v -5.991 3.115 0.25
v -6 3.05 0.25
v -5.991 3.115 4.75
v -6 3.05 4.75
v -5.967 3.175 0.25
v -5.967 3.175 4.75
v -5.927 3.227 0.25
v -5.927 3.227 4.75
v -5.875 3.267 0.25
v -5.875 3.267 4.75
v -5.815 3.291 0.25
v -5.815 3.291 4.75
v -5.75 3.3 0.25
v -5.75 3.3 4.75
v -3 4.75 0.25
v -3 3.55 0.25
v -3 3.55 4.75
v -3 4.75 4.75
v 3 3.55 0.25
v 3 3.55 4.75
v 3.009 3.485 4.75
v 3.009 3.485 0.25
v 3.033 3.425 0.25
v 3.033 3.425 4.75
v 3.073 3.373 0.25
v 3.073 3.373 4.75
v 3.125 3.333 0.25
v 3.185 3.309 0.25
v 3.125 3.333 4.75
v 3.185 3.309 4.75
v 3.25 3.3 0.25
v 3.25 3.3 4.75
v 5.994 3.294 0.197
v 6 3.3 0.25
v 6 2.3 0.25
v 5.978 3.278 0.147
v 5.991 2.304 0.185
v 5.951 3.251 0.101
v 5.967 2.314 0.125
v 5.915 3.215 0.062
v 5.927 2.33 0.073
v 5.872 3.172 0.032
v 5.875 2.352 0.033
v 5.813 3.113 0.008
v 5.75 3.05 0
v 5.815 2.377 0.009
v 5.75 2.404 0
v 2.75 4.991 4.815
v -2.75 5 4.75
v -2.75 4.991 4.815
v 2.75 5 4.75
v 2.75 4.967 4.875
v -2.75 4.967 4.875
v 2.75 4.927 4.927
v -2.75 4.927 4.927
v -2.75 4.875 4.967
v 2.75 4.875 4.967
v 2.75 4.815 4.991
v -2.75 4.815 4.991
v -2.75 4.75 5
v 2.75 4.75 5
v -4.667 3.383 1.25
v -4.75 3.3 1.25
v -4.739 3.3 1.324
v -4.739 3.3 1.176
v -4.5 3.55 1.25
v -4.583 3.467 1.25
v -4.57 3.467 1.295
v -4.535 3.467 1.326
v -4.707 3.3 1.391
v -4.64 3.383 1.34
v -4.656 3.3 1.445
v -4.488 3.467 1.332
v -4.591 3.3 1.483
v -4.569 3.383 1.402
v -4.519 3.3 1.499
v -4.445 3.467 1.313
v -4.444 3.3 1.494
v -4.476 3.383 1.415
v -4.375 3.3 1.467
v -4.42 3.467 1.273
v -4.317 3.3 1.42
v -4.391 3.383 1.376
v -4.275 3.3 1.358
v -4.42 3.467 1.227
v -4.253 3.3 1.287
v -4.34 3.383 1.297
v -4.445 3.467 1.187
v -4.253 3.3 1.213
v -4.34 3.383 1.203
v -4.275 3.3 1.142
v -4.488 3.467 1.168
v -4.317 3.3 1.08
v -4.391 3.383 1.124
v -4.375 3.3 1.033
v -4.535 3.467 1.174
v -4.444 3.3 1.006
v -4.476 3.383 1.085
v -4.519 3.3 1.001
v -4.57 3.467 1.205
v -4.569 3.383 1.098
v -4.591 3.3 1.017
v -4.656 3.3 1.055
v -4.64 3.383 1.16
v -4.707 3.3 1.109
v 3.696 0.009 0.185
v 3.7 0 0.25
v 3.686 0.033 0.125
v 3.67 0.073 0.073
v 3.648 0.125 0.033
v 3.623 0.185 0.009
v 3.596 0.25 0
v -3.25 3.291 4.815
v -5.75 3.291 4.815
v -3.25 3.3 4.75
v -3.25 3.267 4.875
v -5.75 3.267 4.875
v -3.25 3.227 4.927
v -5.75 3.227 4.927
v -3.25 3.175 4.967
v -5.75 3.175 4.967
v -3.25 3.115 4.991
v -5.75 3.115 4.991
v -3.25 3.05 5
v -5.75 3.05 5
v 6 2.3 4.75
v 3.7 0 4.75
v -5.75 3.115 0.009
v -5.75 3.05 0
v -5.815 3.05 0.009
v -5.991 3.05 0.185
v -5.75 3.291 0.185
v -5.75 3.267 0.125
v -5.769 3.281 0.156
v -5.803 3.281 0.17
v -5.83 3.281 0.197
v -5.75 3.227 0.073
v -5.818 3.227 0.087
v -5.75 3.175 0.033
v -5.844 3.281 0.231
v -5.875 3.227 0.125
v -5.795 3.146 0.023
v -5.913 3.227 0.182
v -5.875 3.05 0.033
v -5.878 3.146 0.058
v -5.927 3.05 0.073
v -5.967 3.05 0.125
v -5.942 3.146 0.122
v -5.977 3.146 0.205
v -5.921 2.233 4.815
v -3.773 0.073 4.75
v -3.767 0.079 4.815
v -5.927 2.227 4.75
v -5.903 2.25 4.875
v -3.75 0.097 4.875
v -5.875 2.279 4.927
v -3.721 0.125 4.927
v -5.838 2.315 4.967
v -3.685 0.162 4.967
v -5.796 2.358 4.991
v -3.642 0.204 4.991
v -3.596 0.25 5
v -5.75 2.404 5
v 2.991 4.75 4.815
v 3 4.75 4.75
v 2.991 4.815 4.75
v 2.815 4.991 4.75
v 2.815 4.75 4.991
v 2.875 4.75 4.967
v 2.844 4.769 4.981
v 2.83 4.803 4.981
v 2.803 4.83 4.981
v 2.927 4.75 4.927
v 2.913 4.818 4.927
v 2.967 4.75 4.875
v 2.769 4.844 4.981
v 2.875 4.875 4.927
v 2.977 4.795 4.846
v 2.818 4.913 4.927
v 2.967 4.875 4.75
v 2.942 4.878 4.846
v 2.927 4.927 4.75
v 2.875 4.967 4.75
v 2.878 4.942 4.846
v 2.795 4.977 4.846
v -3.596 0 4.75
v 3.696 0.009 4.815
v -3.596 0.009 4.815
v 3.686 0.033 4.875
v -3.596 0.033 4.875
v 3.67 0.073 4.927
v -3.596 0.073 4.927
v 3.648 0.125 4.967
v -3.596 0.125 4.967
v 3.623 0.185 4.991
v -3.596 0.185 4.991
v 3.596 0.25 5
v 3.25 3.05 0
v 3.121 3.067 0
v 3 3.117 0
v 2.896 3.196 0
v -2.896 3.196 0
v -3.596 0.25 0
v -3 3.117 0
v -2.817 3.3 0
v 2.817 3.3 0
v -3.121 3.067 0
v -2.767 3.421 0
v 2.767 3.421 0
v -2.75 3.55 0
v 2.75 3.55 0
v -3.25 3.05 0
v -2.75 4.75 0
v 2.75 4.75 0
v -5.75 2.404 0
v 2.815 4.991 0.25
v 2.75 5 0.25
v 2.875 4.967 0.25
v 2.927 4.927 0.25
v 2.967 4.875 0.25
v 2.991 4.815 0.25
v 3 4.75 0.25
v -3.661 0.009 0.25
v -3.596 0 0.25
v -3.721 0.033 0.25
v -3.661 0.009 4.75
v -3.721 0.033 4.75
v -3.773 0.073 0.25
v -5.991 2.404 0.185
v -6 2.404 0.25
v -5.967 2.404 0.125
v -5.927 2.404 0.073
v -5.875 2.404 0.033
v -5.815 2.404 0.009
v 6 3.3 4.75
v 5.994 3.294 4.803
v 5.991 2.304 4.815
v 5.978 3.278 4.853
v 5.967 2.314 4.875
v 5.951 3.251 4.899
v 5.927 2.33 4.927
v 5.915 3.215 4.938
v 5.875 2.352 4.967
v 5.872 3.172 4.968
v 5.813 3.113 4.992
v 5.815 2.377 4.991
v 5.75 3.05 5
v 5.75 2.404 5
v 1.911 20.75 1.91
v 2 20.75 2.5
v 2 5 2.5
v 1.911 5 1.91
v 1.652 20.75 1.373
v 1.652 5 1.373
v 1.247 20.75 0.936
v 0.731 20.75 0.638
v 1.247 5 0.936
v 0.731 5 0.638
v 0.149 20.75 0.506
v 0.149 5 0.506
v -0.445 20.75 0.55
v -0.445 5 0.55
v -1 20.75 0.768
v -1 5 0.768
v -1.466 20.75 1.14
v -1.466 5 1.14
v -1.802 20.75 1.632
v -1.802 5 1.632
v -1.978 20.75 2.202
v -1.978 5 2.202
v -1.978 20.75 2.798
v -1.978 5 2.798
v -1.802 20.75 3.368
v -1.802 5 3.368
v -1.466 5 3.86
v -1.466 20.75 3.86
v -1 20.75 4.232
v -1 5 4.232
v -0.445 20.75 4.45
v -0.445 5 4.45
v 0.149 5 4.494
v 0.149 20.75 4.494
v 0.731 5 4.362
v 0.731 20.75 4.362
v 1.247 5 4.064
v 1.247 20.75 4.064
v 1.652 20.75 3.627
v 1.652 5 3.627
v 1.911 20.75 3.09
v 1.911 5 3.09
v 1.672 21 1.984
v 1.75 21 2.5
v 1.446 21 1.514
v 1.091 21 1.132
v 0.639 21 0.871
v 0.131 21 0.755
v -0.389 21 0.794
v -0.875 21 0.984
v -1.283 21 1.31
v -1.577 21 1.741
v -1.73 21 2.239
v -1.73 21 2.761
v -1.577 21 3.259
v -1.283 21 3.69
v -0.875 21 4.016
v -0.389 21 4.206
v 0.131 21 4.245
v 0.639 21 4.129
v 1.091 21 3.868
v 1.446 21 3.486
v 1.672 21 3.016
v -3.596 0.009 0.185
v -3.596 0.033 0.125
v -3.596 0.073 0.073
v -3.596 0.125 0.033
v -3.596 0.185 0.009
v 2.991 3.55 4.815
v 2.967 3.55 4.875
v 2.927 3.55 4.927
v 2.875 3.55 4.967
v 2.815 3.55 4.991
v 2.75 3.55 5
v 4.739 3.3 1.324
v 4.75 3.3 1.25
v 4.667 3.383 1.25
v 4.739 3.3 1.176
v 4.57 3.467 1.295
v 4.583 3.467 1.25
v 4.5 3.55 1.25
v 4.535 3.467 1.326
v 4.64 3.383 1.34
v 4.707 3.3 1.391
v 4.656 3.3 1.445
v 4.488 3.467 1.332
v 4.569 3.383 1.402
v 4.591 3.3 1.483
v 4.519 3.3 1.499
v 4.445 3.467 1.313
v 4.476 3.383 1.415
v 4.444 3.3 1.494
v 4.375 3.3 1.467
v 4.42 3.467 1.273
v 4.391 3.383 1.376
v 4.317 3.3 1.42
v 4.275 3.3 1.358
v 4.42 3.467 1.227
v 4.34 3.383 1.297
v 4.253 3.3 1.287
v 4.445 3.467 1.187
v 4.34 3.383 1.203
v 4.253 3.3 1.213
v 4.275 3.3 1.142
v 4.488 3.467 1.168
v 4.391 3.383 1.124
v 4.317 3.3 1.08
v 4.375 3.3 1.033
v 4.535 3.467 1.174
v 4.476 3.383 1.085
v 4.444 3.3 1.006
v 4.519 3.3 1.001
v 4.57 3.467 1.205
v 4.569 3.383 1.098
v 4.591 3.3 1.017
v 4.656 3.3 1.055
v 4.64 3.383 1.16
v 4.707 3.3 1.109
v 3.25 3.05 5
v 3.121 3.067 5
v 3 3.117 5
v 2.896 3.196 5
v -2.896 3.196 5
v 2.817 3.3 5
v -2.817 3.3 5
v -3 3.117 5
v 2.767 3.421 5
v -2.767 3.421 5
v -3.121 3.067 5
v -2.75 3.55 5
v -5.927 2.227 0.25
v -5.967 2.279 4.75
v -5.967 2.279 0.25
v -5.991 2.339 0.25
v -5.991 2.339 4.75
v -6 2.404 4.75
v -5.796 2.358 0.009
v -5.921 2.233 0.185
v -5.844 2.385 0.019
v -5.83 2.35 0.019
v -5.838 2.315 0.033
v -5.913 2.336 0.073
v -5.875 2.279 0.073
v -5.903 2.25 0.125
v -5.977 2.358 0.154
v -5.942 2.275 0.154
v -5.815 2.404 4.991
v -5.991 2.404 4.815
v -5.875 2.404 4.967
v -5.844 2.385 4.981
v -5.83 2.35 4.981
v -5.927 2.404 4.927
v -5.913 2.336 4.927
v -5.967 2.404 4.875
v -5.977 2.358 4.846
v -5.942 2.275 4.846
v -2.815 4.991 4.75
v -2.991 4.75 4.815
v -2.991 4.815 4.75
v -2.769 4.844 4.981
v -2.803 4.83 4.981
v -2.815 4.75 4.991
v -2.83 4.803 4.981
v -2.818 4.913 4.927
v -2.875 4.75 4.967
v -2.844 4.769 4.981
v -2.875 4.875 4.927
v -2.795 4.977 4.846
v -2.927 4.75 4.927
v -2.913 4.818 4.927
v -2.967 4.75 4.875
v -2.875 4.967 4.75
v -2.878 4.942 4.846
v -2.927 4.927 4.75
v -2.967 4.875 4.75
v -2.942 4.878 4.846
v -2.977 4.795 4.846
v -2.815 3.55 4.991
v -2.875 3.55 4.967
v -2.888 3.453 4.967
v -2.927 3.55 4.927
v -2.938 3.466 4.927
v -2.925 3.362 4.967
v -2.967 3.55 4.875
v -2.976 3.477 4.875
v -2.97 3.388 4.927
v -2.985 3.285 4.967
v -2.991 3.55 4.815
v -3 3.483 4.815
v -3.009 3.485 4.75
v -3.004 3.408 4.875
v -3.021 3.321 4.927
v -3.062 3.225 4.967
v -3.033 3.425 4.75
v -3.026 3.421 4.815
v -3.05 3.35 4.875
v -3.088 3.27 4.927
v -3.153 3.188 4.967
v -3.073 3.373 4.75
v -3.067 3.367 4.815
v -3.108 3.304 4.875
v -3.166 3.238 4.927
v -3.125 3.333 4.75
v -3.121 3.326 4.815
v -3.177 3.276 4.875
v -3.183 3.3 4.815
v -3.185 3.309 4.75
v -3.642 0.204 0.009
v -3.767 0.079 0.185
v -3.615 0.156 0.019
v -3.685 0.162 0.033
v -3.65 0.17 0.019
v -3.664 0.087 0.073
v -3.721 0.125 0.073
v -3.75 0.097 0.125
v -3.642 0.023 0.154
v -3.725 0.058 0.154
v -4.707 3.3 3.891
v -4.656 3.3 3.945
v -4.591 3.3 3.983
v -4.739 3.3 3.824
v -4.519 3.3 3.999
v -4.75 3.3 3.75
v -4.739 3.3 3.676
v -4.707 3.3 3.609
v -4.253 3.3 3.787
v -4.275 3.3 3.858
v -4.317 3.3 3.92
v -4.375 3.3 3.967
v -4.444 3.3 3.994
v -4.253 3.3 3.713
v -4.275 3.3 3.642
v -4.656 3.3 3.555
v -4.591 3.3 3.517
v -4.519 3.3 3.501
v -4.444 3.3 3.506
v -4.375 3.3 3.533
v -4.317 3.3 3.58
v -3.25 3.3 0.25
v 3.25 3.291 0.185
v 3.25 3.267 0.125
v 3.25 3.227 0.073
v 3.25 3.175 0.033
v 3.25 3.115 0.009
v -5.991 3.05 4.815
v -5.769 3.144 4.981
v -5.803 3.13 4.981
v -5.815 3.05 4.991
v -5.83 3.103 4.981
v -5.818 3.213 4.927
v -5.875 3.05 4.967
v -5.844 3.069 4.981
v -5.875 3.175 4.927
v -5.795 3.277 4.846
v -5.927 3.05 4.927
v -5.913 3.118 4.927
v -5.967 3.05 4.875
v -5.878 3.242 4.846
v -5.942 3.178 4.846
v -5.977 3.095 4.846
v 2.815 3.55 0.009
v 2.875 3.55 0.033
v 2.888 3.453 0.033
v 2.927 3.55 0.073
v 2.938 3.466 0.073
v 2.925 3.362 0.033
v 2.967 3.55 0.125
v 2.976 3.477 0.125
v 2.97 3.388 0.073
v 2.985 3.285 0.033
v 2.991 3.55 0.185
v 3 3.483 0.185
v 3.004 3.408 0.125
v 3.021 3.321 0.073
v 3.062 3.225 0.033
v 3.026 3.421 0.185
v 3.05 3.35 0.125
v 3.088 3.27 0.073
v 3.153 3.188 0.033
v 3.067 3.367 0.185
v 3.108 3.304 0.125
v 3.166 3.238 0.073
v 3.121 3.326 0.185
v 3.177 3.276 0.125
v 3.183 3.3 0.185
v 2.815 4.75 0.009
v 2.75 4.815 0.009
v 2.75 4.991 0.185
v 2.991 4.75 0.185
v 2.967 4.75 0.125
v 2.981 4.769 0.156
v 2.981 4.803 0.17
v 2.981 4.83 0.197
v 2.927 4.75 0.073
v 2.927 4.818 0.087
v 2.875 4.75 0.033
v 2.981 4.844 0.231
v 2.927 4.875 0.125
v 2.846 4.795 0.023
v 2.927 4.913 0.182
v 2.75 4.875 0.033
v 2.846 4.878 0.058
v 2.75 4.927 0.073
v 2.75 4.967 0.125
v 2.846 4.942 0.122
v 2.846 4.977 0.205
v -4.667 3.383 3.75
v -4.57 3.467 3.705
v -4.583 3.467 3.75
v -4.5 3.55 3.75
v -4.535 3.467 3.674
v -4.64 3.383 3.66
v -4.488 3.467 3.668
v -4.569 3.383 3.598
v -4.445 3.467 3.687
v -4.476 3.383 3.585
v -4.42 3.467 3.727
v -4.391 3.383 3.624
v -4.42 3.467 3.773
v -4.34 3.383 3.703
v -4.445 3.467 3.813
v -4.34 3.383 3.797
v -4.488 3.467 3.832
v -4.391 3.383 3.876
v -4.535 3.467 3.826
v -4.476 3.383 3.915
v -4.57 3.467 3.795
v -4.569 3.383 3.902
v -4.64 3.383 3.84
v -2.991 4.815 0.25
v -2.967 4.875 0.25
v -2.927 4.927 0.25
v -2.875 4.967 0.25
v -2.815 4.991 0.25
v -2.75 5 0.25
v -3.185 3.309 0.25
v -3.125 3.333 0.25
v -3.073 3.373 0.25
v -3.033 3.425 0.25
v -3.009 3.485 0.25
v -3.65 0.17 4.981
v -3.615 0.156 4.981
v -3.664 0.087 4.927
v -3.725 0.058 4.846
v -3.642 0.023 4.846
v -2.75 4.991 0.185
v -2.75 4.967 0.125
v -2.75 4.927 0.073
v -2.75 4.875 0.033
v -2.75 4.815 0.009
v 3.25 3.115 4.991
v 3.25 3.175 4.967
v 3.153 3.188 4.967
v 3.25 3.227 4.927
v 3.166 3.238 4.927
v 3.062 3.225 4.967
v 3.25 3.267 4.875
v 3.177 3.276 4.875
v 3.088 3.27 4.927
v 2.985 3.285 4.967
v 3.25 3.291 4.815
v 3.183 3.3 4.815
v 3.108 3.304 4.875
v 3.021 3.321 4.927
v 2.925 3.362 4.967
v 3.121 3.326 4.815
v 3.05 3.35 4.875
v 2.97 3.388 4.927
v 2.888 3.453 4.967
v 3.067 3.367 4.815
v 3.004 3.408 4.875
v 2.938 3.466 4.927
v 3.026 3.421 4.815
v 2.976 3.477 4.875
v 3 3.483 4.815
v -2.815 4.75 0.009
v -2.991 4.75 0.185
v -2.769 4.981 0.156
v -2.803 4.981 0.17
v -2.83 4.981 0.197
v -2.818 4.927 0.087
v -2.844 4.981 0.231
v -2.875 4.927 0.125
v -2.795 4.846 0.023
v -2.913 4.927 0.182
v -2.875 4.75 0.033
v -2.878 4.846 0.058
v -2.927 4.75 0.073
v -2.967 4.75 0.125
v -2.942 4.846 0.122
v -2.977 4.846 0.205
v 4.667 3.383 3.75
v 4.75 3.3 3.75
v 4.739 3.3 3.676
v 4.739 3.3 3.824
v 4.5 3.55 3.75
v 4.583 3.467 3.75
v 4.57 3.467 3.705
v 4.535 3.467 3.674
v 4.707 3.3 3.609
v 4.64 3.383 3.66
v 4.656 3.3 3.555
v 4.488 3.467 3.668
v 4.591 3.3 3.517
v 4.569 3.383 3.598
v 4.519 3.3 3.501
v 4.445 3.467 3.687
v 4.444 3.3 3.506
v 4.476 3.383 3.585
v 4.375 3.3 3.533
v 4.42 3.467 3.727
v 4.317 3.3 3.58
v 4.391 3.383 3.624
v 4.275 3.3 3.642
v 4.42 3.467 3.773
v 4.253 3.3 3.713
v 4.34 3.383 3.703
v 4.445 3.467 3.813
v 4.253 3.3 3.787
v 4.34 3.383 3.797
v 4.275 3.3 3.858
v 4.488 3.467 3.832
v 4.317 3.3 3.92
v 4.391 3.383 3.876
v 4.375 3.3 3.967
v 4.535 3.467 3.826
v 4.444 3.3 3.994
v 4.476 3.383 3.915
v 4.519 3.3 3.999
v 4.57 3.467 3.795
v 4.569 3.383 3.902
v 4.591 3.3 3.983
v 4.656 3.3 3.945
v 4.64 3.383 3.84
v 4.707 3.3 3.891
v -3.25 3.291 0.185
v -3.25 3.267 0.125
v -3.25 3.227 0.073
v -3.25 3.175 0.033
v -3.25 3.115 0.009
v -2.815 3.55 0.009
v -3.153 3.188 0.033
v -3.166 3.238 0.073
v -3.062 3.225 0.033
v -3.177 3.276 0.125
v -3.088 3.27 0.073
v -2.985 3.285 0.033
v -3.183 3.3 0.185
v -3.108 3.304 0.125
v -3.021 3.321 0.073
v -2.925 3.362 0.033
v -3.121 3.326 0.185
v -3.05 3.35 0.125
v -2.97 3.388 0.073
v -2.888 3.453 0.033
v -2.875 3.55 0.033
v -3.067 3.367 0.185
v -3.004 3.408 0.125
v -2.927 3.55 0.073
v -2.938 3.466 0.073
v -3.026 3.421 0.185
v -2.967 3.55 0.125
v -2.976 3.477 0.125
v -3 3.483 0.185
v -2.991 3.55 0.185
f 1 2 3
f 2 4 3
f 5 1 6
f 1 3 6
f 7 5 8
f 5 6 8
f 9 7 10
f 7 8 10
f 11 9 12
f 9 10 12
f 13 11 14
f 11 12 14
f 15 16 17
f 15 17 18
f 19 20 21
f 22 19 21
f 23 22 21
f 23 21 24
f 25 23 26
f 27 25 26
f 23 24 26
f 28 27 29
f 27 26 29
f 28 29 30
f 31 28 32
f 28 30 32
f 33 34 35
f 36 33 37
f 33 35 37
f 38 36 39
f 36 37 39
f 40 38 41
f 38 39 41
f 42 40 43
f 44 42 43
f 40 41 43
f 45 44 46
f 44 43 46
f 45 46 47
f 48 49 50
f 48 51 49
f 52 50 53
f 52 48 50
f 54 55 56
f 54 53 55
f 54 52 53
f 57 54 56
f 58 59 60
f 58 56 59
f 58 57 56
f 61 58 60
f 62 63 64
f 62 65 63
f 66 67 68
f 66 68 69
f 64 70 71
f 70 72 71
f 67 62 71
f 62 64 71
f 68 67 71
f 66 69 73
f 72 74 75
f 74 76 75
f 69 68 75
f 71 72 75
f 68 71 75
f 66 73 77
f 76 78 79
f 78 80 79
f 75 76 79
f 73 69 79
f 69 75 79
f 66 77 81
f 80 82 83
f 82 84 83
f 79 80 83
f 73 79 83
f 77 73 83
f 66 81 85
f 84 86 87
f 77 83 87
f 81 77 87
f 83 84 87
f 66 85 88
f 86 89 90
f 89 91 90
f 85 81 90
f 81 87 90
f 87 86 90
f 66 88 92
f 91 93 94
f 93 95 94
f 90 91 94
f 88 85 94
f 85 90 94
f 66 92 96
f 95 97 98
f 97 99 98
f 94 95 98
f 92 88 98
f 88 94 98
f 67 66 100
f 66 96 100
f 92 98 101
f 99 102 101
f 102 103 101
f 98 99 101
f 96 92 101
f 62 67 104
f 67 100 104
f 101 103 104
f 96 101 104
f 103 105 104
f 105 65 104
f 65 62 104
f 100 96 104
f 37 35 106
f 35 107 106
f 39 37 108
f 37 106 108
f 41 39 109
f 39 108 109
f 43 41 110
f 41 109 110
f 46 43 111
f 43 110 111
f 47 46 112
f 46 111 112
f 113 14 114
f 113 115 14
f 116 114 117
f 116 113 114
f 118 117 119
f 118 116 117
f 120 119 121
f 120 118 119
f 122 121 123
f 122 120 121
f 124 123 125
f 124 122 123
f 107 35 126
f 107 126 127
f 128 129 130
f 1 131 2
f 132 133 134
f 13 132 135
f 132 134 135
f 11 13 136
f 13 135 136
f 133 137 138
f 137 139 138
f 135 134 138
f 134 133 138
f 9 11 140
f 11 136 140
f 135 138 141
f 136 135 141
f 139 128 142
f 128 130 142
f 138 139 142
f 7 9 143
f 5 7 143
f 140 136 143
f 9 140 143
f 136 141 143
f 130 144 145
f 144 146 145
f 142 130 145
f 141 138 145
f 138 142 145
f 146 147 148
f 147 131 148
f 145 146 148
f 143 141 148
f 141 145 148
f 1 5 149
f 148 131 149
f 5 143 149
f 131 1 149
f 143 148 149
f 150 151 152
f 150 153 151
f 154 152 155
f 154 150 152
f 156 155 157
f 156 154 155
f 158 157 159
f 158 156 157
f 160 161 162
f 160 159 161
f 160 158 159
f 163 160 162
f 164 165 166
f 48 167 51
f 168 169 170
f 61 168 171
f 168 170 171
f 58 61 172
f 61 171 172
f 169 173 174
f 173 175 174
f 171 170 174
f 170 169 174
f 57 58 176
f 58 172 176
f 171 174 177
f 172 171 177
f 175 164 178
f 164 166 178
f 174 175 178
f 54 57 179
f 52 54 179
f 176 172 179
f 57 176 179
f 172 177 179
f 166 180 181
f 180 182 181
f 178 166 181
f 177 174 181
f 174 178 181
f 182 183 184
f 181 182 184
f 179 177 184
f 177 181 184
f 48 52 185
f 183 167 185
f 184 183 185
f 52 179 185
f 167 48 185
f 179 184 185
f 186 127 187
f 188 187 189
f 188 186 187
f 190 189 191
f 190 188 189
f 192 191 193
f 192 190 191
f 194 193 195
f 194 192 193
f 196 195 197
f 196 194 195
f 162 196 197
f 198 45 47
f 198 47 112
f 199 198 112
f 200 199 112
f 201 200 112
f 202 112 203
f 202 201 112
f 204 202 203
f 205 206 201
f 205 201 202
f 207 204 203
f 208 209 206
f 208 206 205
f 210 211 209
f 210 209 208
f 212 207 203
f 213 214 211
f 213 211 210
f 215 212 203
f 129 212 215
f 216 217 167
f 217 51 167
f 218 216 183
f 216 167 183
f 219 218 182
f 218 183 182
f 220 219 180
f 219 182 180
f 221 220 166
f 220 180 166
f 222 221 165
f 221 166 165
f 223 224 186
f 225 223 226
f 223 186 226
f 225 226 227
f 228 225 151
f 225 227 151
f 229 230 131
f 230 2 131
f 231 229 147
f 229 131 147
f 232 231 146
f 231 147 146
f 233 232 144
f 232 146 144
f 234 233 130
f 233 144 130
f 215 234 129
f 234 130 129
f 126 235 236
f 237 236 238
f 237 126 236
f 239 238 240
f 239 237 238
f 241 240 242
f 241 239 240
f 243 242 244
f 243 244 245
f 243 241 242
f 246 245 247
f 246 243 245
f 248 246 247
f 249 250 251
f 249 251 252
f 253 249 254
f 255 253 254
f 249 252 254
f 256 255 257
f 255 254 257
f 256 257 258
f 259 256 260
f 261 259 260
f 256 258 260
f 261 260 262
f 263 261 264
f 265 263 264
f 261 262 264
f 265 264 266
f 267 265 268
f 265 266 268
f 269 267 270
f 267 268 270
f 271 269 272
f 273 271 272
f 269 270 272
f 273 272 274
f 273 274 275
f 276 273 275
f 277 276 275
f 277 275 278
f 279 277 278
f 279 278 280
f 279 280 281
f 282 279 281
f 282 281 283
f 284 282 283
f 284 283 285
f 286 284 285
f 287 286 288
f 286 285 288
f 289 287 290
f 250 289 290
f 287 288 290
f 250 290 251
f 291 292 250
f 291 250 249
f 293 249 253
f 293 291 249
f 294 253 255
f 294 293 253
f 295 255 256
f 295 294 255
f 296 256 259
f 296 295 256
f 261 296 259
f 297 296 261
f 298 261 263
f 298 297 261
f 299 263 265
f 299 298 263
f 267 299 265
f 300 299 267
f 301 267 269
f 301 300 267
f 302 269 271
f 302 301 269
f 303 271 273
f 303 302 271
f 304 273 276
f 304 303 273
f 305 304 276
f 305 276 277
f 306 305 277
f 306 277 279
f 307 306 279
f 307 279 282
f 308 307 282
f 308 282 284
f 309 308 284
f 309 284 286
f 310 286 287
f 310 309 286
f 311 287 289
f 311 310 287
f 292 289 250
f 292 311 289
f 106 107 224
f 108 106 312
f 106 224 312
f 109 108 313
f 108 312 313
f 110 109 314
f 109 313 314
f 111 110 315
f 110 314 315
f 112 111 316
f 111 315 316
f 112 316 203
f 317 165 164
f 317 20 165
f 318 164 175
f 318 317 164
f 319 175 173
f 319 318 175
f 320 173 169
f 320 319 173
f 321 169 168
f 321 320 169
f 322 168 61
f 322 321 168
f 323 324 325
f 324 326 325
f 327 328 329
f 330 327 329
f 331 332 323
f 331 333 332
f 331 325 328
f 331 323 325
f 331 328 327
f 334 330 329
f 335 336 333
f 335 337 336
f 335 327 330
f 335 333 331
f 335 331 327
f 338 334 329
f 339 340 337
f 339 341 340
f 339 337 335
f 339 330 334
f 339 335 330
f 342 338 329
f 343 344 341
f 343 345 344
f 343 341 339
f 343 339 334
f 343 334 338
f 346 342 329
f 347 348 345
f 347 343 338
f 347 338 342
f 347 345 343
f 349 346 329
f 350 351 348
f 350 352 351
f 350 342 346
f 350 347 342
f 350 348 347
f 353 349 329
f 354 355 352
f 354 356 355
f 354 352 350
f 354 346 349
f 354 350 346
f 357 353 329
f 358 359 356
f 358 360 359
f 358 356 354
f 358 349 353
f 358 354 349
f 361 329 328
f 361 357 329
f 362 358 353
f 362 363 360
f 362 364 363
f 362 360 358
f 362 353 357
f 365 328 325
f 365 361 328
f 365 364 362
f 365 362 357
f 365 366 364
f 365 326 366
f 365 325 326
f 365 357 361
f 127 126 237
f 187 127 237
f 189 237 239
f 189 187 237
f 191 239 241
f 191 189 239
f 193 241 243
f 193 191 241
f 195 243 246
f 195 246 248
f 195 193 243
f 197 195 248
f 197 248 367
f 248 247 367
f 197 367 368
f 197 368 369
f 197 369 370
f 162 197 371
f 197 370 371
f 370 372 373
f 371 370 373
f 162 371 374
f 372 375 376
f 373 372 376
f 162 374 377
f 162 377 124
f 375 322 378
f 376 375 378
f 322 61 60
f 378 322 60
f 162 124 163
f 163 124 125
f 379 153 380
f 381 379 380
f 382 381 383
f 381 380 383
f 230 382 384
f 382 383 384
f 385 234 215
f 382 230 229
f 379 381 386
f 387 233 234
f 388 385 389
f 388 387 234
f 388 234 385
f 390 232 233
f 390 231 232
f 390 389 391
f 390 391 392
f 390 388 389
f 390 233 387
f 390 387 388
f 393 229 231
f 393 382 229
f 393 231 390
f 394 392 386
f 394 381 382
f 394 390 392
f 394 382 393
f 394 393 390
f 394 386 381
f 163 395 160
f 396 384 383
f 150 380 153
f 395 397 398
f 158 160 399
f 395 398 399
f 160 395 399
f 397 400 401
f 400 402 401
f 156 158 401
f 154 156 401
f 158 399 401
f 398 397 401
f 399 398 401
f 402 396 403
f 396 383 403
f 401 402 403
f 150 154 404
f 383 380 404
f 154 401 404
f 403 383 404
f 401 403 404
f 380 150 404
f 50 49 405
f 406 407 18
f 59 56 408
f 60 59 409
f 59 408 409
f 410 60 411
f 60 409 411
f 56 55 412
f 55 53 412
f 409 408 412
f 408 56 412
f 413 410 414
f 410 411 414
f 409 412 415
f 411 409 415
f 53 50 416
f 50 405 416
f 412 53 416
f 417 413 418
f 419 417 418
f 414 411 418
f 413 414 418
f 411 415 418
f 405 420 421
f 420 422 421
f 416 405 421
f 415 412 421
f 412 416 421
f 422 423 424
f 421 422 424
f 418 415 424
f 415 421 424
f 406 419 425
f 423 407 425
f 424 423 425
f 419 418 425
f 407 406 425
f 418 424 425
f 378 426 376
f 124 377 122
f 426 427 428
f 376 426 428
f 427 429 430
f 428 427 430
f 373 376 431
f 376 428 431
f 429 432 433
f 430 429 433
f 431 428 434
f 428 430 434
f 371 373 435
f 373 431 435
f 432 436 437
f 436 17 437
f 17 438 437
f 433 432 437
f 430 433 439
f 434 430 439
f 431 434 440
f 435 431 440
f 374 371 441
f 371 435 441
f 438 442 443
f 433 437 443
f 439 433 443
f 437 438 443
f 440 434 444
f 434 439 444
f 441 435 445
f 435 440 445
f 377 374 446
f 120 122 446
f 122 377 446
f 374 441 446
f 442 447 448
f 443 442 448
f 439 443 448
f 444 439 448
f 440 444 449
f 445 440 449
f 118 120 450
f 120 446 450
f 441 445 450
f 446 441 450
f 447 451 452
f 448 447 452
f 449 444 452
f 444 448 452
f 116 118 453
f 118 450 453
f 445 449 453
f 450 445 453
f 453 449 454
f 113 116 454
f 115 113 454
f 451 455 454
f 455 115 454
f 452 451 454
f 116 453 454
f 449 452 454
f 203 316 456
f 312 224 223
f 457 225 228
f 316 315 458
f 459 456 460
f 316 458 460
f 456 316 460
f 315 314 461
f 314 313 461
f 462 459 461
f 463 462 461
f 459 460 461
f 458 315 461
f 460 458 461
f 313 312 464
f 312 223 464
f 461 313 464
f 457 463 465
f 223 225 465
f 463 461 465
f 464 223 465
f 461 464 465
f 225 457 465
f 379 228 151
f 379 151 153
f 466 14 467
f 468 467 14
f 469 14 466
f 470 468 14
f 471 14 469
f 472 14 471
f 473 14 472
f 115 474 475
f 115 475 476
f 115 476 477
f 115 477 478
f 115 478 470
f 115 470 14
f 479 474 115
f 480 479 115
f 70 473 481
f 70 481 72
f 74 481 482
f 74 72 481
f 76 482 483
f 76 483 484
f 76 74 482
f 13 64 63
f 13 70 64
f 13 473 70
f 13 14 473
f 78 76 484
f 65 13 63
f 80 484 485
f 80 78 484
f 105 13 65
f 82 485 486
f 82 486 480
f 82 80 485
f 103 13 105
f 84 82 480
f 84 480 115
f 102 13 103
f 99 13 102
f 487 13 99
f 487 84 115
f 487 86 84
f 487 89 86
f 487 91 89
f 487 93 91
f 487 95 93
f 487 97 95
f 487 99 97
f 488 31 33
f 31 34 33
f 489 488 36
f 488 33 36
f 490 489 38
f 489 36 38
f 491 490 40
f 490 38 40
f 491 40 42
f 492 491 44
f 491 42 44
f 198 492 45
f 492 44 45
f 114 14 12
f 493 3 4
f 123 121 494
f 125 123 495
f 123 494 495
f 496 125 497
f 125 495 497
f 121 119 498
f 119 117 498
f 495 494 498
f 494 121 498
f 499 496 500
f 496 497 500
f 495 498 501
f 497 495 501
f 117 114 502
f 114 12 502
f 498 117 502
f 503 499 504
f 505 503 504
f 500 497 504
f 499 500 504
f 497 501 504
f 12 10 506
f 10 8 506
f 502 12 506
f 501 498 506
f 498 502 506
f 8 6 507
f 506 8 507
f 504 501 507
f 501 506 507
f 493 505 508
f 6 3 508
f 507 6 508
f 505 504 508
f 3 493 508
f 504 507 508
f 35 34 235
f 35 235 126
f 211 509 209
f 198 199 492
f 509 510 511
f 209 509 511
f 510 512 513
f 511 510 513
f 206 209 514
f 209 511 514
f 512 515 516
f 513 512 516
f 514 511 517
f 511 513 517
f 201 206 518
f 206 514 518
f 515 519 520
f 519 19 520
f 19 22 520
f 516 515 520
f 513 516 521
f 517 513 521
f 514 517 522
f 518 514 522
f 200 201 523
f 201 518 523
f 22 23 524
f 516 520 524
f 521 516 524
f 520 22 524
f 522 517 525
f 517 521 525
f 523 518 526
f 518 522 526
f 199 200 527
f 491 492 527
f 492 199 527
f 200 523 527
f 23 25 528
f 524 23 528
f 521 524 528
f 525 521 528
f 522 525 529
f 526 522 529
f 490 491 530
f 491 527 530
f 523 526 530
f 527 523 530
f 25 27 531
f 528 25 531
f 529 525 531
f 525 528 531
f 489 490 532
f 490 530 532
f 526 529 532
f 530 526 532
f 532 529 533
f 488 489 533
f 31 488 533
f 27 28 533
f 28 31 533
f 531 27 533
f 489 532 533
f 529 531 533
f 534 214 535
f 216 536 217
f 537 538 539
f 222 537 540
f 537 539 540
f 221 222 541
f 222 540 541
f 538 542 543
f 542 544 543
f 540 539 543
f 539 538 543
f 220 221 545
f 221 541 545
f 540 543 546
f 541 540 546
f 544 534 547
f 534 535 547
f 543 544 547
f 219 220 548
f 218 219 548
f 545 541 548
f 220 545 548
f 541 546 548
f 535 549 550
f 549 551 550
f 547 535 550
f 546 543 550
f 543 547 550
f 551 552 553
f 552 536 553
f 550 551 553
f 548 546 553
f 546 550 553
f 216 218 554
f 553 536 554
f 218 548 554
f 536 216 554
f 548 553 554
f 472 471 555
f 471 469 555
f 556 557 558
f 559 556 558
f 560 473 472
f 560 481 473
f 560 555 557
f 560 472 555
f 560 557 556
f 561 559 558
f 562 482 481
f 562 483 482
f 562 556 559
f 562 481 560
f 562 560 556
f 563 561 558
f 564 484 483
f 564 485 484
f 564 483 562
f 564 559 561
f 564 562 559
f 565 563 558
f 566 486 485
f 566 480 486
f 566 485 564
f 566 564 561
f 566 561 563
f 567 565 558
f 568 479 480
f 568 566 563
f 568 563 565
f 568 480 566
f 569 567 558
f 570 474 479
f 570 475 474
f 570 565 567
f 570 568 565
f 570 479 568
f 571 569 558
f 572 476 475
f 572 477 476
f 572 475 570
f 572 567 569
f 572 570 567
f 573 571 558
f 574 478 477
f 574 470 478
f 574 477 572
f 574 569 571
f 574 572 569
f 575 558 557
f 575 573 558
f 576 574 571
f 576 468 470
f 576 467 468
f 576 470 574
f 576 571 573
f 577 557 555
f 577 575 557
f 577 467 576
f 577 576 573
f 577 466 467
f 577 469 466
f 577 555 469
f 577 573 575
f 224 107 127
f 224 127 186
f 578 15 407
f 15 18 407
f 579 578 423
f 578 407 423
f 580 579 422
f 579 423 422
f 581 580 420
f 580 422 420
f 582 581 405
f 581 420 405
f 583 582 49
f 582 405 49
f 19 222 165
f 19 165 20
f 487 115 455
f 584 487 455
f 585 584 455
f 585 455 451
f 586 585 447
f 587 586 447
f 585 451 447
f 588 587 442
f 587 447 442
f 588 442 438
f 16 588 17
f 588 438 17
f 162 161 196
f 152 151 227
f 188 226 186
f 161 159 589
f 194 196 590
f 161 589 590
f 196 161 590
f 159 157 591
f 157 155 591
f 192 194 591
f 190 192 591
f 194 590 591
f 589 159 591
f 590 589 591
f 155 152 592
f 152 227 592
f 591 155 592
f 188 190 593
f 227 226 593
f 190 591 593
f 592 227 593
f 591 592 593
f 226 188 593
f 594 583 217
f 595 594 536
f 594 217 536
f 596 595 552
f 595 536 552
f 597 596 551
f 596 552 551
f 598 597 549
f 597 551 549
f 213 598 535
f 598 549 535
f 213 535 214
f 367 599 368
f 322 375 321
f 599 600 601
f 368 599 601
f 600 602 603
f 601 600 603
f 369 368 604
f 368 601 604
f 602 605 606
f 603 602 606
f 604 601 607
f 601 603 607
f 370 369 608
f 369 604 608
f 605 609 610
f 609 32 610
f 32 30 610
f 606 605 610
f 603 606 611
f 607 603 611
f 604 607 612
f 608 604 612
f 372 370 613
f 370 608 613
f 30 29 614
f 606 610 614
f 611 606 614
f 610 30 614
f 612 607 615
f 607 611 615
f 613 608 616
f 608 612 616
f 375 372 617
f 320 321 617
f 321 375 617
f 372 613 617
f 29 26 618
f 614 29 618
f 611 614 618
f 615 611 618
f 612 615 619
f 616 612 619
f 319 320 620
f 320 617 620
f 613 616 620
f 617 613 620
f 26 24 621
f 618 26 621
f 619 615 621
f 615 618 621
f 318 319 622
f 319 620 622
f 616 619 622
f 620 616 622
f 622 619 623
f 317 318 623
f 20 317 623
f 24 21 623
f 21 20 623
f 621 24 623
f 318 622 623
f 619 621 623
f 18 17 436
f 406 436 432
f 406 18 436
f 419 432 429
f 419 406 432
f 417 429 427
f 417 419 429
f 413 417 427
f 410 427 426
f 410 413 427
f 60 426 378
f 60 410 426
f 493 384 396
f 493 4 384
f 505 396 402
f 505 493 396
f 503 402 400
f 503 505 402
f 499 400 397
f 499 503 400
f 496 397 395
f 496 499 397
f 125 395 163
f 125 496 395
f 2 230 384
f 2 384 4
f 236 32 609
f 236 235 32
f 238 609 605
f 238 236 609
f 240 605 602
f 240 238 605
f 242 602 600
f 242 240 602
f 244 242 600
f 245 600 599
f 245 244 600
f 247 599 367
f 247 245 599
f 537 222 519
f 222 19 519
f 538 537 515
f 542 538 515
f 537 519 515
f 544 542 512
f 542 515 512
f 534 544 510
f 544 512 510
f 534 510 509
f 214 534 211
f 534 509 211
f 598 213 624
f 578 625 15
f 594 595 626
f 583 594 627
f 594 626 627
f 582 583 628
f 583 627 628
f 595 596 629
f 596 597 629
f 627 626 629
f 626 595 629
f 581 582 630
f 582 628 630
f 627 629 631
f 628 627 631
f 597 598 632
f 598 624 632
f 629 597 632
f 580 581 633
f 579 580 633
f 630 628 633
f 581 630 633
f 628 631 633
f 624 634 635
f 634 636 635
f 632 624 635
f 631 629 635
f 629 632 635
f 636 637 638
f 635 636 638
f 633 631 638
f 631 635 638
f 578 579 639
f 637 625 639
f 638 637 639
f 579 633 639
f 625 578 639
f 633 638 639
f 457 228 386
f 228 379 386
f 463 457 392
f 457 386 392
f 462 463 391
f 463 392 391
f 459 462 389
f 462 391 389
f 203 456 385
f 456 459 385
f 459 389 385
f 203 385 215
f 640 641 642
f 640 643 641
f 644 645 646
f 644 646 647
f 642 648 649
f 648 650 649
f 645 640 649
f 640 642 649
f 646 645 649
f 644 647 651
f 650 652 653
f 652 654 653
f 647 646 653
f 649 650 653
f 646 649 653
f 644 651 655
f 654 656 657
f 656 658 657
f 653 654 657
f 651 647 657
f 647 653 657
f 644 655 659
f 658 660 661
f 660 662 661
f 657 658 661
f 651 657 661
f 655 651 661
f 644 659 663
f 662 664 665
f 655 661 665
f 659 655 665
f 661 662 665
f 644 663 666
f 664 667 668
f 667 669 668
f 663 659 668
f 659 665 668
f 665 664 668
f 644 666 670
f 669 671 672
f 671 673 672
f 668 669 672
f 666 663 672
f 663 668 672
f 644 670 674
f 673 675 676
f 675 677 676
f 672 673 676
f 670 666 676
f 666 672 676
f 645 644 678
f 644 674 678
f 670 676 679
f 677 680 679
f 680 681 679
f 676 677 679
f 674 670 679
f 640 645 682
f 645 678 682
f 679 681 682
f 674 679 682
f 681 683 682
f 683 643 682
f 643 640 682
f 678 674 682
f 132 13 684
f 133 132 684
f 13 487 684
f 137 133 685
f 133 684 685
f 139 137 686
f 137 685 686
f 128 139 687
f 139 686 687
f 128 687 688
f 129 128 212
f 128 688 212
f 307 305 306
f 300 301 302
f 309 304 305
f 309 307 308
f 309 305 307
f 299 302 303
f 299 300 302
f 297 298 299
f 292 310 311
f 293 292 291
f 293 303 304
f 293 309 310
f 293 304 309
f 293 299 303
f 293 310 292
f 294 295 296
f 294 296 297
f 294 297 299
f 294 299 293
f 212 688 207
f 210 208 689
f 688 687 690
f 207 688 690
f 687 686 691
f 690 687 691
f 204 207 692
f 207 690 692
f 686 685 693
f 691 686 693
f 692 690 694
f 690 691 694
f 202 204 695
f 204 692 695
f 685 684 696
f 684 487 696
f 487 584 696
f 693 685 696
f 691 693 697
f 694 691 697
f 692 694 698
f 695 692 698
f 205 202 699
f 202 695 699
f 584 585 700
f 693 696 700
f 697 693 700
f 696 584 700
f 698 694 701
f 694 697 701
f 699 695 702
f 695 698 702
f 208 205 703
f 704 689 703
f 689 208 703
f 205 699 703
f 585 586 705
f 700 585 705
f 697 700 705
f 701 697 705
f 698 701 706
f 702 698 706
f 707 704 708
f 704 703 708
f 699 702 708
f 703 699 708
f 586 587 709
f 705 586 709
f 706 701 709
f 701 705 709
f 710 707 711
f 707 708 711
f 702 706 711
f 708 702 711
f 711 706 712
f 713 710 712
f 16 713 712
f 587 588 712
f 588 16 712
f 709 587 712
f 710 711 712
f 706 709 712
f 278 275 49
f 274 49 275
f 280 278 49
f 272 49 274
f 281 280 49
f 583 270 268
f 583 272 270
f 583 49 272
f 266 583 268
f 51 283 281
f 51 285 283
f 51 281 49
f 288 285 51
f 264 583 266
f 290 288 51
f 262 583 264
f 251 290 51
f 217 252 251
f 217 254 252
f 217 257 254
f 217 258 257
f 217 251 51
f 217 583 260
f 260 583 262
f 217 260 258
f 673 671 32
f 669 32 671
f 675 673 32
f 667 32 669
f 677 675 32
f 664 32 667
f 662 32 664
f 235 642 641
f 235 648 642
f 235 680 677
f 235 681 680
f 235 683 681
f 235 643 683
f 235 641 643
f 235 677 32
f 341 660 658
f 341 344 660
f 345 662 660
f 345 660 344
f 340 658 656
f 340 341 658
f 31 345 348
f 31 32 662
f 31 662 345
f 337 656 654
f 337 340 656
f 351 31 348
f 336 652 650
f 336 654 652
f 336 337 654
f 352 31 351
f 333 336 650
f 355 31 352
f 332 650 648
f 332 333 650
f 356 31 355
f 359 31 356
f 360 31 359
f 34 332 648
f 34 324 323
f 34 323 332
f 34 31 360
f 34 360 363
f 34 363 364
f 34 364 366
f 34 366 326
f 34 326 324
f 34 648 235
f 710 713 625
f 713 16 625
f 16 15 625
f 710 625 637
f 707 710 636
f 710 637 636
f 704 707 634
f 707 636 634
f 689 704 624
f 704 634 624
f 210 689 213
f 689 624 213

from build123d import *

# Parameters (mm, degrees)
ESTRUSIONE_ESTRUSIONE1_DEPTH = 5
RACCORDO1_R                  = 0.25
SCHIZZO7_R                   = 2
ESTRUSIONE_ESTRUSIONE3_DEPTH = 16
SMUSSO1_SIZE                 = 0.25


with BuildPart() as part:
    # Schizzo1 → Estrusione-Estrusione1 (new body)
    with BuildSketch(Plane.XY):
        Polygon((3.7, 0), (-3.7, 0), (-6, 2.3), (-6, 3.3), (-3, 3.3), (-3, 5), (3, 5), (3, 3.3), (6, 3.3), (6, 2.3), align=None)
    extrude(amount=ESTRUSIONE_ESTRUSIONE1_DEPTH)

    # Raccordo1
    raccordo1_edges = [part.edges().sort_by_distance(p)[0] for p in [
        (-6, 2.8, 0),
        (-4.5, 3.3, 0),
        (-3, 4.15, 0),
        (0, 5, 0),
        (3, 4.15, 0),
        (4.5, 3.3, 0),
        (6, 2.8, 0),
        (4.85, 1.15, 5),
        (4.85, 1.15, 0),
        (0, 0, 0),
        (-4.85, 1.15, 0),
        (6, 2.8, 5),
        (-6, 2.3, 2.5),
        (-6, 3.3, 2.5),
        (-3, 3.3, 2.5),
        (-3, 5, 2.5),
        (3, 5, 2.5),
        (3, 3.3, 2.5),
        (-3.7, 0, 2.5),
        (4.5, 3.3, 5),
        (3, 4.15, 5),
        (0, 5, 5),
        (-3, 4.15, 5),
        (-4.5, 3.3, 5),
        (-6, 2.8, 5),
        (-4.85, 1.15, 5),
        (0, 0, 5),
    ]]
    fillet(raccordo1_edges, radius=RACCORDO1_R)

    # Schizzo7 → Estrusione-Estrusione3 (add)
    with BuildSketch(Plane(origin=(0, 5, 0), x_dir=(1, 0, 0), z_dir=(0, 1, 0))):
        with Locations((0, -2.5)):
            Circle(SCHIZZO7_R)
    extrude(amount=ESTRUSIONE_ESTRUSIONE3_DEPTH)

    # Smusso1
    smusso1_edges = [part.edges().sort_by_distance(p)[0] for p in [
        (-2, 21, 2.5),
    ]]
    chamfer(smusso1_edges, length=SMUSSO1_SIZE)

    # Schizzo8 → Rivoluzione2 (revolve)
    with BuildSketch(Plane.XY.offset(1.25)):
        Polygon((-4.5, 3.3), (-4.5, 3.55), (-4.75, 3.3), align=None)
    rivoluzione2 = revolve(axis=Axis((-4.5, 3.3, 1.25), (0, 1, 0)))

    # Specchia3: Rivoluzione2 across plane
    add(rivoluzione2.mirror(Plane(origin=(0, 0, 0), x_dir=(0, 0, 1), z_dir=(1, 0, 0))))

    # Specchia4: Rivoluzione2 across plane
    add(rivoluzione2.mirror(Plane.XY.offset(2.5)))

    # Specchia4 copy 1 sketch → Specchia4 copy 1 (revolve)
    with BuildSketch(Plane(origin=(0, 0, 3.75), x_dir=(-1, 0, 0), z_dir=(0, 0, -1))):
        Polygon((-4.5, 3.3), (-4.5, 3.55), (-4.75, 3.3), align=None)
    revolve(axis=Axis((4.5, 3.3, 3.75), (0, 1, 0)))


solid = part.part
